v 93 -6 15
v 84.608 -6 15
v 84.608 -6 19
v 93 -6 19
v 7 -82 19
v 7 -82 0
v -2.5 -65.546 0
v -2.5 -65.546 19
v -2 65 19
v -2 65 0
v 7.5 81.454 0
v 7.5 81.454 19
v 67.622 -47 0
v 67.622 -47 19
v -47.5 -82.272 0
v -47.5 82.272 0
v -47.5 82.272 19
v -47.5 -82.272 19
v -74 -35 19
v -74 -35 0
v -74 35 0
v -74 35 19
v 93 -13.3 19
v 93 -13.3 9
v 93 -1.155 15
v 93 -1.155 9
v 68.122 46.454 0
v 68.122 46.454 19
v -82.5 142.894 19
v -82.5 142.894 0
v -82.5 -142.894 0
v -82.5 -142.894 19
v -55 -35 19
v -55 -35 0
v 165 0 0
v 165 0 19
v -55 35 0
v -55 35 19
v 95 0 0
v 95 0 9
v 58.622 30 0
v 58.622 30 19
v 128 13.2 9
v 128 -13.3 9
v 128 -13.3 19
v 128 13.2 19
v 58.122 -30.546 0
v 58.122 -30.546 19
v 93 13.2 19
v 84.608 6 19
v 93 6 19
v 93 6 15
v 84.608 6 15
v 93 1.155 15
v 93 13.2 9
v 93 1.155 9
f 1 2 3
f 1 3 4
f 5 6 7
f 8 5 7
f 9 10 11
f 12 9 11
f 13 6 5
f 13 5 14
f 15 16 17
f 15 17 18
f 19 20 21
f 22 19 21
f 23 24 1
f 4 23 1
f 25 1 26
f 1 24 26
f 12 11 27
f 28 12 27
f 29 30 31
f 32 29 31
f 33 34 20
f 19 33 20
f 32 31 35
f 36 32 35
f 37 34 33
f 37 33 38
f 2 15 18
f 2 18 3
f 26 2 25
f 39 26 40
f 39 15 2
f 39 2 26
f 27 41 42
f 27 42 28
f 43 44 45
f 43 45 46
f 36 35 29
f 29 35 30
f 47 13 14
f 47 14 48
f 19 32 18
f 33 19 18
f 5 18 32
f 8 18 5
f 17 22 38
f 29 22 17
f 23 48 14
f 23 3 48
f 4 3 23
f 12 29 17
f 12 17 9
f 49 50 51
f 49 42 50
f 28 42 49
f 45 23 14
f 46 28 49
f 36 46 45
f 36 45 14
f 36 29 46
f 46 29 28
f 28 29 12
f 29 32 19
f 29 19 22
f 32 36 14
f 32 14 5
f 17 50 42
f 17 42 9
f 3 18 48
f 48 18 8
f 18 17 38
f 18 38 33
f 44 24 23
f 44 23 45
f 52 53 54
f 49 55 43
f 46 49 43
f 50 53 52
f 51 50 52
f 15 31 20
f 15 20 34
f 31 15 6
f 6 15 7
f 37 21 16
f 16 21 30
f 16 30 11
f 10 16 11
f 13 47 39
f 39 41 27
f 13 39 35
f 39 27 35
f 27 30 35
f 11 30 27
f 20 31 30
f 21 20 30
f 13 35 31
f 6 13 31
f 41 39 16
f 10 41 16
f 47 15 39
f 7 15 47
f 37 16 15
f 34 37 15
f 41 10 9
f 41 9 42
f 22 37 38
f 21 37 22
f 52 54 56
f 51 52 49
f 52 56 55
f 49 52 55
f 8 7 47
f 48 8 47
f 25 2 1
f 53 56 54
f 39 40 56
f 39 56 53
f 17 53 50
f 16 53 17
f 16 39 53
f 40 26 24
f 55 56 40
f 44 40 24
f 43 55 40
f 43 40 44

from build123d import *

# Parameters (mm, degrees)
BOX004_W               = 10
BOX004_H               = 12
BOX004_DEPTH           = 4
BOX003_W               = 35
BOX003_H               = 26.5
BOX003_DEPTH           = 10
BOX002_W               = 70
BOX002_H               = 19
BOX002_DEPTH           = 19
BOX002_PLACEMENT_ANGLE = 30
BOX001_W               = 70
BOX001_H               = 19
BOX001_DEPTH           = 19
BOX001_PLACEMENT_ANGLE = 90
BOX_W                  = 70
BOX_H                  = 19
BOX_DEPTH              = 19
BOX_PLACEMENT_ANGLE    = 30
PRISM001_DEPTH         = 19
PRISM_DEPTH            = 19


with BuildPart() as box004:
    # Box004 → Box004 (new body)
    with BuildSketch(Plane(origin=(84, -6, 15), x_dir=(1, 0, 0), z_dir=(0, 0, 1))):
        with Locations((5, 6)):
            Rectangle(BOX004_W, BOX004_H)
    extrude(amount=BOX004_DEPTH)


with BuildPart() as box003:
    # Box003 → Box003 (new body)
    with BuildSketch(Plane(origin=(93, -13.3, 9), x_dir=(1, 0, 0), z_dir=(0, 0, 1))):
        with Locations((17.5, 13.25)):
            Rectangle(BOX003_W, BOX003_H)
    extrude(amount=BOX003_DEPTH)


with BuildPart() as box002:
    # Box002 → Box002 (new body)
    with BuildSketch(Plane.XY):
        with Locations((35, 9.5)):
            Rectangle(BOX002_W, BOX002_H)
    extrude(amount=BOX002_DEPTH)


with BuildPart() as box002_1:
    # Box002 placement: moved
    add(box002.part.moved(Location((7, -82, 0))).rotate(Axis((7, -82, 0), (0, 0, 1)), BOX002_PLACEMENT_ANGLE))


with BuildPart() as box001:
    # Box001 → Box001 (new body)
    with BuildSketch(Plane.XY):
        with Locations((35, 9.5)):
            Rectangle(BOX001_W, BOX001_H)
    extrude(amount=BOX001_DEPTH)


with BuildPart() as box001_1:
    # Box001 placement: moved
    add(box001.part.moved(Location((-55, -35, 0))).rotate(Axis((-55, -35, 0), (0, 0, 1)), BOX001_PLACEMENT_ANGLE))


with BuildPart() as box:
    # Box → Box (new body)
    with BuildSketch(Plane.XY):
        with Locations((35, 9.5)):
            Rectangle(BOX_W, BOX_H)
    extrude(amount=BOX_DEPTH)


with BuildPart() as box_1:
    # Box placement: moved
    add(box.part.moved(Location((-2, 65, 0))).rotate(Axis((-2, 65, 0), (0, 0, -1)), BOX_PLACEMENT_ANGLE))


with BuildPart() as prism001:
    # Prism001 → Prism001 (new body)
    with BuildSketch(Plane.XY):
        Polygon((95, 0), (-47.5, 82.272413), (-47.5, -82.272413), align=None)
    extrude(amount=PRISM001_DEPTH)


with BuildPart() as cut005:
    # Prism → Prism (new body)
    with BuildSketch(Plane.XY):
        Polygon((165, 0), (-82.5, 142.894192), (-82.5, -142.894192), align=None)
    extrude(amount=PRISM_DEPTH)

    # Cut: cut Prism001
    add(prism001.part, mode=Mode.SUBTRACT)

    # Cut001: cut Box
    add(box_1.part, mode=Mode.SUBTRACT)

    # Cut002: cut Box001
    add(box001_1.part, mode=Mode.SUBTRACT)

    # Cut003: cut Box002
    add(box002_1.part, mode=Mode.SUBTRACT)

    # Cut004: cut Box003
    add(box003.part, mode=Mode.SUBTRACT)

    # Cut005: cut Box004
    add(box004.part, mode=Mode.SUBTRACT)


solid = cut005.part
